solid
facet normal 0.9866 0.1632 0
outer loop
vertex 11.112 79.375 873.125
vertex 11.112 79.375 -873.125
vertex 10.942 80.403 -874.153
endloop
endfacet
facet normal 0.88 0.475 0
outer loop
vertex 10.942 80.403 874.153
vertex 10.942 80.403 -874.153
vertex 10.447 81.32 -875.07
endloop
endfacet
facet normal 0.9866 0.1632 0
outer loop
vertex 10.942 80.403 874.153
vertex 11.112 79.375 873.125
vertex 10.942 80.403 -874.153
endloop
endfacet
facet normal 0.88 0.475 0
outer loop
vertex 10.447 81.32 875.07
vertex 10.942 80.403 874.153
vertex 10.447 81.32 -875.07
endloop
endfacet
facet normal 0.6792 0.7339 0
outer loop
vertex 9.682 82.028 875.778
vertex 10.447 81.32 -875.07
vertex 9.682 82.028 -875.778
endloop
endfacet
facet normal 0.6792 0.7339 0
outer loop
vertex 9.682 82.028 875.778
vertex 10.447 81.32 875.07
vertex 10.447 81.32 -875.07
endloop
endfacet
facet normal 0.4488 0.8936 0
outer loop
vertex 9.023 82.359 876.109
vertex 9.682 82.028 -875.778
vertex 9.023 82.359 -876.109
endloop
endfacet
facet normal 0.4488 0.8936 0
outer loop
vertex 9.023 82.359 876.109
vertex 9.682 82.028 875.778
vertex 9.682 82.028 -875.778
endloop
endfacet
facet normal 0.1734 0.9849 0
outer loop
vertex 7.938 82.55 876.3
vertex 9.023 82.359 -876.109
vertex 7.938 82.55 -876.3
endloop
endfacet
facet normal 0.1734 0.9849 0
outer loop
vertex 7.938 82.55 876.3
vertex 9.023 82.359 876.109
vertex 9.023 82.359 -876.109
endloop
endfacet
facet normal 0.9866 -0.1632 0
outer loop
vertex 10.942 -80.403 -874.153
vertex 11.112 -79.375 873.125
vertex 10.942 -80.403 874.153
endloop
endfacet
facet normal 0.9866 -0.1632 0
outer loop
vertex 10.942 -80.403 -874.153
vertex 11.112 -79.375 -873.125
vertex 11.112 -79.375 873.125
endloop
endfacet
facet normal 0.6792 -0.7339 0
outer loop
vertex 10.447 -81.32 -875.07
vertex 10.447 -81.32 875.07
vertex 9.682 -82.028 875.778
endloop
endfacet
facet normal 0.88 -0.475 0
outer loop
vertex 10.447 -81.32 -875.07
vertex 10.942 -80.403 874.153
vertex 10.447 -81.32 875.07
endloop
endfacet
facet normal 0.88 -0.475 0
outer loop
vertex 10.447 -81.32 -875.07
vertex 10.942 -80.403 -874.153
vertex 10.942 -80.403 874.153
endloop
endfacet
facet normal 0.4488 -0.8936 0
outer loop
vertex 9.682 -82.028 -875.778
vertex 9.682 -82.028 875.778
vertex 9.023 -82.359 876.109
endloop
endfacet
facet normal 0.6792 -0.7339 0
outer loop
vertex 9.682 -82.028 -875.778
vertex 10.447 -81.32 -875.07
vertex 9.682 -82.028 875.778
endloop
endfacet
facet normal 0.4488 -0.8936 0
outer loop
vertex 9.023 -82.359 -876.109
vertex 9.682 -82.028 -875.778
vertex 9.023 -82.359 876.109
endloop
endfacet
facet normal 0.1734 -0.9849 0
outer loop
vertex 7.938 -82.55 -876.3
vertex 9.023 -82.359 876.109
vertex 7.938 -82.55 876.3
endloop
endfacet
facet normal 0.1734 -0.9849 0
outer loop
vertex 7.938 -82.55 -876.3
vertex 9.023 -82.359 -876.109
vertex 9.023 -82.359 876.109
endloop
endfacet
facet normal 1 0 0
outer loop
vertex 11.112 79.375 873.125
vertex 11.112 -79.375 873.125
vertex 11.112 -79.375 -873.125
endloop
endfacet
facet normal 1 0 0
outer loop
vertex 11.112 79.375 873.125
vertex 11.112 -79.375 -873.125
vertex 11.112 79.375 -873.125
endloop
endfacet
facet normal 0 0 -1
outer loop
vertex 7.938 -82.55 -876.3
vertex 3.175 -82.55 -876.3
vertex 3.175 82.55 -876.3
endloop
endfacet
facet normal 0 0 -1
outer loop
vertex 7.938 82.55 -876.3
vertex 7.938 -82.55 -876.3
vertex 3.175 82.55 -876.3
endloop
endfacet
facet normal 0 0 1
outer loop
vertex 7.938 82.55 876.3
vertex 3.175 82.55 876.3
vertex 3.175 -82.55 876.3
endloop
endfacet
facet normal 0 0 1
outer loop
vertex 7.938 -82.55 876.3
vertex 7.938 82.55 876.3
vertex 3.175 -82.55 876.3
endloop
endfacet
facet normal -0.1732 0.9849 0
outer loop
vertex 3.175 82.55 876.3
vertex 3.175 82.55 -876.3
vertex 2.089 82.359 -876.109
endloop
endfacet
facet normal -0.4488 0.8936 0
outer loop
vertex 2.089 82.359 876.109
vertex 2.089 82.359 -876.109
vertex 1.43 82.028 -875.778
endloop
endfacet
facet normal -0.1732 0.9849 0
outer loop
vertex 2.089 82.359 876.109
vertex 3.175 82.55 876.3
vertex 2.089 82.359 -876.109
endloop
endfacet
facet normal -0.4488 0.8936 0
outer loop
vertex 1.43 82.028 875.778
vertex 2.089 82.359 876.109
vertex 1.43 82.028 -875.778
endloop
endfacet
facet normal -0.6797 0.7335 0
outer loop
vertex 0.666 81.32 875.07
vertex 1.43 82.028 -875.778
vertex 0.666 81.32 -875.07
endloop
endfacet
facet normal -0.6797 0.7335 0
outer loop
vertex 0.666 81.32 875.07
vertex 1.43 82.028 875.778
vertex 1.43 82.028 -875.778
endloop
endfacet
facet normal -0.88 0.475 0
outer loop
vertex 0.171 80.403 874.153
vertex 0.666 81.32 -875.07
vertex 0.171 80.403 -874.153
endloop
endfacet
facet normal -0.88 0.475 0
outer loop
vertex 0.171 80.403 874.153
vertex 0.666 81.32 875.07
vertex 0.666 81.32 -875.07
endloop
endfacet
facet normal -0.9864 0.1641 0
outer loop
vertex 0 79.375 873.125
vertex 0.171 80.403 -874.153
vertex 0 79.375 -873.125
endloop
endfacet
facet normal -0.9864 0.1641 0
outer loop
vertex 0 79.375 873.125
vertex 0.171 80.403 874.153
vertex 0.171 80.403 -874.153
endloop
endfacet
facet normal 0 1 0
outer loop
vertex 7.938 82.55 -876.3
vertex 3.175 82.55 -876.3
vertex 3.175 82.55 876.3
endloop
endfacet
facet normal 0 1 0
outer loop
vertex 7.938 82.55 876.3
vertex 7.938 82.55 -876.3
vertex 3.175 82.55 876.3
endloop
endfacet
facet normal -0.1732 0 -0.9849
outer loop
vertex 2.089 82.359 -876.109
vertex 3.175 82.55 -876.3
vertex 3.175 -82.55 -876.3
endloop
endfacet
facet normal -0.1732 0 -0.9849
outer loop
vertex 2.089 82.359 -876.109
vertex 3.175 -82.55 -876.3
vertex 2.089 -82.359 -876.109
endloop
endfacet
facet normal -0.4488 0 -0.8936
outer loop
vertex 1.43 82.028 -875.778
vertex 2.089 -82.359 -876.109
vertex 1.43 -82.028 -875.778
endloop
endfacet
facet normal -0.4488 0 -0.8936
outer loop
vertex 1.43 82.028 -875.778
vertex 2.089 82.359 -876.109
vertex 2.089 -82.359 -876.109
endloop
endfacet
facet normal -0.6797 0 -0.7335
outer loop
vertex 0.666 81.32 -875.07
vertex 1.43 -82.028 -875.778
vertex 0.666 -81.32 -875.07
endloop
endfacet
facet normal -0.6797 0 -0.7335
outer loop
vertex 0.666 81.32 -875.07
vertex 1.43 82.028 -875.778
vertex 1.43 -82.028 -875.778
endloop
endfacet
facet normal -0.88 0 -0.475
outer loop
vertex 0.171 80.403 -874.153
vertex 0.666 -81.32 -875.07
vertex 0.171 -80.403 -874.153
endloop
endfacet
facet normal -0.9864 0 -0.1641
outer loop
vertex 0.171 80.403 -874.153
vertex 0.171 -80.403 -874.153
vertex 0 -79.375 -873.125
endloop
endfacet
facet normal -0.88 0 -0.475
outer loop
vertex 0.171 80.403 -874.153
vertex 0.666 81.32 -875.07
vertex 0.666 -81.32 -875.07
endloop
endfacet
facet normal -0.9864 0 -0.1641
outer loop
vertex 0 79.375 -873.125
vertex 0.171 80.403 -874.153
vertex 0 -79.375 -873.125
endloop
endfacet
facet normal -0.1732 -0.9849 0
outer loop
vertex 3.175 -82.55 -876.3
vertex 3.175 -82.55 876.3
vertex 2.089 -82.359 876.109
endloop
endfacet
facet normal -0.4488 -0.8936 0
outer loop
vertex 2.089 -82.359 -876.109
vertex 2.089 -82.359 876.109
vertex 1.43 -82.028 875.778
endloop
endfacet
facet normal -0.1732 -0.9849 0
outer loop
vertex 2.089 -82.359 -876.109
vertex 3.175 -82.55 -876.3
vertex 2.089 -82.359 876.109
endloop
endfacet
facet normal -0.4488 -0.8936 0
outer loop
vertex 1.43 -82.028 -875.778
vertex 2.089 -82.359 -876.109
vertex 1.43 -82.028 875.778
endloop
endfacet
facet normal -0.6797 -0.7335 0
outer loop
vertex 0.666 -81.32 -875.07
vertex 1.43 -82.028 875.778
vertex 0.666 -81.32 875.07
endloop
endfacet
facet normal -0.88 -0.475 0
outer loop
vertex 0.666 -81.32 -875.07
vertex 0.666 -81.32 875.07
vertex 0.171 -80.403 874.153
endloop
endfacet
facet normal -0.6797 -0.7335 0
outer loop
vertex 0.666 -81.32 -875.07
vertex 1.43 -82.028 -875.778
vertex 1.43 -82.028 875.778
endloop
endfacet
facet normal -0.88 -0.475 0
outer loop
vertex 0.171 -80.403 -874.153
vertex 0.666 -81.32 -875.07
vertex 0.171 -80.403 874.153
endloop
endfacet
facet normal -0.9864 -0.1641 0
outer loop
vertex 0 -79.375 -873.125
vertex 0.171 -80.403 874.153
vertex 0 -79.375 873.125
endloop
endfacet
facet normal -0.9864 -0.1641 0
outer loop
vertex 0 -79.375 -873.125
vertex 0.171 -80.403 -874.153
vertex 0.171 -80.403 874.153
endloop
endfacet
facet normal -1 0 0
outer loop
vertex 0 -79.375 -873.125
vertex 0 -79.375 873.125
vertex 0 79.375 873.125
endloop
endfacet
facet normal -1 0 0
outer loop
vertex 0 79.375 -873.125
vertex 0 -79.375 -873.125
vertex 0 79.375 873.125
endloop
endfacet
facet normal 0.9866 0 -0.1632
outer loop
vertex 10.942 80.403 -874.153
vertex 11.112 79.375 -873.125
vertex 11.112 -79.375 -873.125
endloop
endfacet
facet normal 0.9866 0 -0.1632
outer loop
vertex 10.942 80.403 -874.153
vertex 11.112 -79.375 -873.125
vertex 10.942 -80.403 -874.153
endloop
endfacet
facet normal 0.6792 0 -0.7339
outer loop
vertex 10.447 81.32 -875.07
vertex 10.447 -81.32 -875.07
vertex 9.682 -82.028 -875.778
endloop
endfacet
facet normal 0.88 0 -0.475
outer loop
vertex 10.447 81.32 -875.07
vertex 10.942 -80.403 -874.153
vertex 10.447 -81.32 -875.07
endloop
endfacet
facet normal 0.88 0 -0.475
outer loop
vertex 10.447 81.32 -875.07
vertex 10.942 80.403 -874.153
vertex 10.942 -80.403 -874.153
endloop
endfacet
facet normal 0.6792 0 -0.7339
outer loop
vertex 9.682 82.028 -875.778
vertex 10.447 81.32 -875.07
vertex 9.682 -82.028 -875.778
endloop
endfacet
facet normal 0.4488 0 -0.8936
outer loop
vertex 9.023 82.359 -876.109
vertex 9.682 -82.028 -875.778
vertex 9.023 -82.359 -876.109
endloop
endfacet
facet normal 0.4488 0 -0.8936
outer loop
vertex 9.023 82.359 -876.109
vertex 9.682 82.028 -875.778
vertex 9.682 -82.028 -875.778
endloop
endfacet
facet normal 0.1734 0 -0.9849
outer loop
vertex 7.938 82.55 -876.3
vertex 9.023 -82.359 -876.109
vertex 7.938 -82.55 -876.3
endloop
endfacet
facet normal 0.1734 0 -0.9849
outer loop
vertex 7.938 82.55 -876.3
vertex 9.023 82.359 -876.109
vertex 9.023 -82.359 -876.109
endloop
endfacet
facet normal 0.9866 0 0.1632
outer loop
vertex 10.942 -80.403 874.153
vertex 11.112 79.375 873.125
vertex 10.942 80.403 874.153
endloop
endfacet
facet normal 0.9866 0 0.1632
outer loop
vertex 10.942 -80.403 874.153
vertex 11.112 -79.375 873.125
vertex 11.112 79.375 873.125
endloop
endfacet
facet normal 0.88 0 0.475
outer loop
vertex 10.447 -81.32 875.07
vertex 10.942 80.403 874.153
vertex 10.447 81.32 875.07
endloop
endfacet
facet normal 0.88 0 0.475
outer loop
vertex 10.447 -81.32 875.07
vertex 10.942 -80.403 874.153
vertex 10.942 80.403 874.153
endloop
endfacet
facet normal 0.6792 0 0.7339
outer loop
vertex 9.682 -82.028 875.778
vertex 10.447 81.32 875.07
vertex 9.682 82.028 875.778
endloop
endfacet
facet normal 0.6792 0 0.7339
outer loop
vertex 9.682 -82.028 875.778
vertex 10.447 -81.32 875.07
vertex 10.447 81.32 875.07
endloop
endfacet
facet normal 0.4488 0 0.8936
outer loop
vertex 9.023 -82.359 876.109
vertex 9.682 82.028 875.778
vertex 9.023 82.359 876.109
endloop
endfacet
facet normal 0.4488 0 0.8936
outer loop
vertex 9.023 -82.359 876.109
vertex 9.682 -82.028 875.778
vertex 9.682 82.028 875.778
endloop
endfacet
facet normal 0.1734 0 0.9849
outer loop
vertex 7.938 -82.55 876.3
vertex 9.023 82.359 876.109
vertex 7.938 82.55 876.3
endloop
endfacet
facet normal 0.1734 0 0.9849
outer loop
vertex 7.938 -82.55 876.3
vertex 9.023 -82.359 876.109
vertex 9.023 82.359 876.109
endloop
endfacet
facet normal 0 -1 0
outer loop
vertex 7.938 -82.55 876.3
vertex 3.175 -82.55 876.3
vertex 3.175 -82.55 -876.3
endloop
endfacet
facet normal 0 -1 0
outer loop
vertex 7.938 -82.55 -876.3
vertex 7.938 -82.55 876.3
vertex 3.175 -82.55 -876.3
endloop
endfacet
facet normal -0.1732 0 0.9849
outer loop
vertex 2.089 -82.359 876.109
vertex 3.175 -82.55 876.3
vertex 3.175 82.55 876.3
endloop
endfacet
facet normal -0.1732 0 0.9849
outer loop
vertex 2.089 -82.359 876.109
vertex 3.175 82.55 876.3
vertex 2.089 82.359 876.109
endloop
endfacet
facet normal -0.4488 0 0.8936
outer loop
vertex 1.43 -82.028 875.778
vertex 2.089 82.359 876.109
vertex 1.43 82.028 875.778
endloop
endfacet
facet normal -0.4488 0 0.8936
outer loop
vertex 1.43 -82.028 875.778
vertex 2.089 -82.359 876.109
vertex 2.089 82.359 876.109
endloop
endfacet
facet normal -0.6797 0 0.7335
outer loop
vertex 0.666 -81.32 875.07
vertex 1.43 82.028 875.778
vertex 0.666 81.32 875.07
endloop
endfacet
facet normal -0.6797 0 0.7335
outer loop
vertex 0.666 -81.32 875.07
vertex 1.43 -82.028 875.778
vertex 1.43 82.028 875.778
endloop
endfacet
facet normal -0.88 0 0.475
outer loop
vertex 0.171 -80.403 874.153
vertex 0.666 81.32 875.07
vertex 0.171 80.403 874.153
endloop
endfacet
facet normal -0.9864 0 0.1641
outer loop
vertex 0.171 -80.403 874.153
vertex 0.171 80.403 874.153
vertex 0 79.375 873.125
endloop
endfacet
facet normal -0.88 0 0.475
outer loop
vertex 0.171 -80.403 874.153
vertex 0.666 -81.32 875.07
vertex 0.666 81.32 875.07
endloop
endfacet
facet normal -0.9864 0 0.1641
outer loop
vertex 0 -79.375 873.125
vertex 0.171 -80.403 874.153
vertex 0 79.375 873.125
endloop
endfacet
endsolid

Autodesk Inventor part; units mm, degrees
ref_plane "YZ Plane" through (0, 0, 0) normal (1, 0, 0) x (0, 1, 0)
ref_plane "XZ Plane" through (0, 0, 0) normal (0, 1, 0) x (-1, 0, 0)
ref_plane "XY Plane" through (0, 0, 0) normal (0, 0, 1) x (1, 0, 0)
sketch "Sketch1" plane through (0, 0, 0) normal (1, 0, 0) x (0, 1, 0)
  line L0 (-82.55, 876.3) -> (-82.55, -876.3)
  line L1 (-82.55, -876.3) -> (82.55, -876.3)
  line L2 (82.55, -876.3) -> (82.55, 876.3)
  line L3 (82.55, 876.3) -> (-82.55, 876.3)
  line L4 (-82.55, 876.3) -> (82.55, -876.3) construction
  line L5 (-82.55, -876.3) -> (82.55, 876.3) construction
  point P0 (0, 0)
  dimension "d0" = 1752.6
  dimension "d1" = 165.1
extrude "Extrusion1" add sketch "Sketch1" along normal blind 11.1125
fillet "Fillet1" radius 3.175 8 edges at (11.1125, 82.55, 0) (11.1125, 0, 876.3) (0, -82.55, 0) (11.1125, 0, -876.3) (11.1125, -82.55, 0) (0, 0, 876.3) (0, 82.55, 0) (0, 0, -876.3)
properties part number "Home Depot Composite Slat 69 in" material "Wood (Cherry)"
